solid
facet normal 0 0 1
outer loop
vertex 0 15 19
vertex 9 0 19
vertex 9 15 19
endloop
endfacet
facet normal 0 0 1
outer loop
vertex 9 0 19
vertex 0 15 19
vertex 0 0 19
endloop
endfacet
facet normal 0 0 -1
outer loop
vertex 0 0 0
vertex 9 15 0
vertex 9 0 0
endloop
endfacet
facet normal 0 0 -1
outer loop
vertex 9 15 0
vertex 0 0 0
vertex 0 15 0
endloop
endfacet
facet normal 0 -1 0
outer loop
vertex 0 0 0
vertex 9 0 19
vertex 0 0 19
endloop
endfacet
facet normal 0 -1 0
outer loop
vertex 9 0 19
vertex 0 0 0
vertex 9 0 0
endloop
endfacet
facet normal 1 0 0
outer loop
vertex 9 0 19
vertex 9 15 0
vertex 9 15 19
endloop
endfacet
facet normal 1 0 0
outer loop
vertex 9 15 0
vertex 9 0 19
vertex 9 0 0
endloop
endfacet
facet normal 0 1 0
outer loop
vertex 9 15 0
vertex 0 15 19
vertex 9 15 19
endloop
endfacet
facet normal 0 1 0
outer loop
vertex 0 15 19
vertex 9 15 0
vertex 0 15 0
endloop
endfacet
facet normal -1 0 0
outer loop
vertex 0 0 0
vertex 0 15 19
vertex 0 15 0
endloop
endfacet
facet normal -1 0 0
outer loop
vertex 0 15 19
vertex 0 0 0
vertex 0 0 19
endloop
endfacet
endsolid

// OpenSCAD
// Generated by SolidPython 1.0.1 on 2020-07-29 00:46:55


cube(size = [9, 15, 19]);
/***********************************************
*********      SolidPython code:      **********
************************************************
 
# import packages: SolidPython
from solid import *
from solid.utils import *
from itertools import chain, combinations, permutations


class Resize:

    def __init__(self, scad_file):
        self.scad_file = scad_file
        #self.scad_file = import_scad(scad_file)
        # cone/cylinder param:
        self.r1 = 0
        self.r2 = 0
        self.h = 0
        # rectangular prism param:
        self.w = 0
        self.l = 0
        # ellipse param:
        self.r = 0

    # import OpenScad code (file name corresponds to shape)


    # classify shape + parameters
    def assign(self, param1, param2, param3):
        if self.scad_file == 'cone.scad':
            self.r1 = param1
            self.r2 = param2
            self.h = param3
        elif self.scad_file == 'cylinder.scad':
            self.r1 = param1
            self.r2 = param2
            self.h = param3
        elif self.scad_file == 'rectangularPrism.scad':
            self.h = param1
            self.l = param2
            self.w = param3
        else:
            self.r = param1
            self.h = param2

    # resize parameters
    def iterate(self):
        x = range(3, 20, 2)
        i = 1
        if self.scad_file == 'cone.scad':
            tempList = list(permutations(x, 2))
            for temp in tempList:
                param1 = temp[0]
                param2 = temp[1]
                filepath = 'produced_scad_files/' + 'cone' + str(param1) + '_' + str(param2) + '_' + '.scad'
                scad_render_to_file(cylinder(h=param1, r1=param2, r2=0), filepath)

        elif self.scad_file == 'cylinder.scad':
            tempList = list(permutations(x, 3))
            for temp in tempList:
                param1 = temp[0]
                param2 = temp[1]
                filepath = 'produced_scad_files/' + 'cylinder' + str(param1) + '_' + str(param2) + '_' + '.scad'
                scad_render_to_file(cylinder(h=param1, r1=param2, r2=param2), filepath)

        elif self.scad_file == 'rectangularPrism.scad':
            tempList = list(permutations(x, 3))
            for temp in tempList:
                param1 = temp[0]
                param2 = temp[1]
                param3 = temp[2]
                filepath = 'produced_scad_files/' + 'rectangularPrism' + str(param1) + '_' + str(param2) + '_' + str(
                    param3) + '.scad'
                scad_render_to_file(cube(size=(param1, param2, param3)), filepath)

        elif self.scad_file == 'ellipse.scad':
            tempList = list(permutations(x, 4))
            for temp in tempList:
                param1 = temp[0]
                param2 = temp[1]
                param3 = temp[2]
                param4 = temp[3]
                filepath = 'produced_scad_files/' + 'ellipse' + str(param1) + '_' + str(param2) + '_' + str(param3) + '_' + str(param4) + '.scad'
                scad_render_to_file(scale([param1, param2, param3])(sphere(r=param4)), filepath)

    def render_to_scadfile(self):
        scad_render_to_file(scad, 'example.scad') 
 
************************************************/
